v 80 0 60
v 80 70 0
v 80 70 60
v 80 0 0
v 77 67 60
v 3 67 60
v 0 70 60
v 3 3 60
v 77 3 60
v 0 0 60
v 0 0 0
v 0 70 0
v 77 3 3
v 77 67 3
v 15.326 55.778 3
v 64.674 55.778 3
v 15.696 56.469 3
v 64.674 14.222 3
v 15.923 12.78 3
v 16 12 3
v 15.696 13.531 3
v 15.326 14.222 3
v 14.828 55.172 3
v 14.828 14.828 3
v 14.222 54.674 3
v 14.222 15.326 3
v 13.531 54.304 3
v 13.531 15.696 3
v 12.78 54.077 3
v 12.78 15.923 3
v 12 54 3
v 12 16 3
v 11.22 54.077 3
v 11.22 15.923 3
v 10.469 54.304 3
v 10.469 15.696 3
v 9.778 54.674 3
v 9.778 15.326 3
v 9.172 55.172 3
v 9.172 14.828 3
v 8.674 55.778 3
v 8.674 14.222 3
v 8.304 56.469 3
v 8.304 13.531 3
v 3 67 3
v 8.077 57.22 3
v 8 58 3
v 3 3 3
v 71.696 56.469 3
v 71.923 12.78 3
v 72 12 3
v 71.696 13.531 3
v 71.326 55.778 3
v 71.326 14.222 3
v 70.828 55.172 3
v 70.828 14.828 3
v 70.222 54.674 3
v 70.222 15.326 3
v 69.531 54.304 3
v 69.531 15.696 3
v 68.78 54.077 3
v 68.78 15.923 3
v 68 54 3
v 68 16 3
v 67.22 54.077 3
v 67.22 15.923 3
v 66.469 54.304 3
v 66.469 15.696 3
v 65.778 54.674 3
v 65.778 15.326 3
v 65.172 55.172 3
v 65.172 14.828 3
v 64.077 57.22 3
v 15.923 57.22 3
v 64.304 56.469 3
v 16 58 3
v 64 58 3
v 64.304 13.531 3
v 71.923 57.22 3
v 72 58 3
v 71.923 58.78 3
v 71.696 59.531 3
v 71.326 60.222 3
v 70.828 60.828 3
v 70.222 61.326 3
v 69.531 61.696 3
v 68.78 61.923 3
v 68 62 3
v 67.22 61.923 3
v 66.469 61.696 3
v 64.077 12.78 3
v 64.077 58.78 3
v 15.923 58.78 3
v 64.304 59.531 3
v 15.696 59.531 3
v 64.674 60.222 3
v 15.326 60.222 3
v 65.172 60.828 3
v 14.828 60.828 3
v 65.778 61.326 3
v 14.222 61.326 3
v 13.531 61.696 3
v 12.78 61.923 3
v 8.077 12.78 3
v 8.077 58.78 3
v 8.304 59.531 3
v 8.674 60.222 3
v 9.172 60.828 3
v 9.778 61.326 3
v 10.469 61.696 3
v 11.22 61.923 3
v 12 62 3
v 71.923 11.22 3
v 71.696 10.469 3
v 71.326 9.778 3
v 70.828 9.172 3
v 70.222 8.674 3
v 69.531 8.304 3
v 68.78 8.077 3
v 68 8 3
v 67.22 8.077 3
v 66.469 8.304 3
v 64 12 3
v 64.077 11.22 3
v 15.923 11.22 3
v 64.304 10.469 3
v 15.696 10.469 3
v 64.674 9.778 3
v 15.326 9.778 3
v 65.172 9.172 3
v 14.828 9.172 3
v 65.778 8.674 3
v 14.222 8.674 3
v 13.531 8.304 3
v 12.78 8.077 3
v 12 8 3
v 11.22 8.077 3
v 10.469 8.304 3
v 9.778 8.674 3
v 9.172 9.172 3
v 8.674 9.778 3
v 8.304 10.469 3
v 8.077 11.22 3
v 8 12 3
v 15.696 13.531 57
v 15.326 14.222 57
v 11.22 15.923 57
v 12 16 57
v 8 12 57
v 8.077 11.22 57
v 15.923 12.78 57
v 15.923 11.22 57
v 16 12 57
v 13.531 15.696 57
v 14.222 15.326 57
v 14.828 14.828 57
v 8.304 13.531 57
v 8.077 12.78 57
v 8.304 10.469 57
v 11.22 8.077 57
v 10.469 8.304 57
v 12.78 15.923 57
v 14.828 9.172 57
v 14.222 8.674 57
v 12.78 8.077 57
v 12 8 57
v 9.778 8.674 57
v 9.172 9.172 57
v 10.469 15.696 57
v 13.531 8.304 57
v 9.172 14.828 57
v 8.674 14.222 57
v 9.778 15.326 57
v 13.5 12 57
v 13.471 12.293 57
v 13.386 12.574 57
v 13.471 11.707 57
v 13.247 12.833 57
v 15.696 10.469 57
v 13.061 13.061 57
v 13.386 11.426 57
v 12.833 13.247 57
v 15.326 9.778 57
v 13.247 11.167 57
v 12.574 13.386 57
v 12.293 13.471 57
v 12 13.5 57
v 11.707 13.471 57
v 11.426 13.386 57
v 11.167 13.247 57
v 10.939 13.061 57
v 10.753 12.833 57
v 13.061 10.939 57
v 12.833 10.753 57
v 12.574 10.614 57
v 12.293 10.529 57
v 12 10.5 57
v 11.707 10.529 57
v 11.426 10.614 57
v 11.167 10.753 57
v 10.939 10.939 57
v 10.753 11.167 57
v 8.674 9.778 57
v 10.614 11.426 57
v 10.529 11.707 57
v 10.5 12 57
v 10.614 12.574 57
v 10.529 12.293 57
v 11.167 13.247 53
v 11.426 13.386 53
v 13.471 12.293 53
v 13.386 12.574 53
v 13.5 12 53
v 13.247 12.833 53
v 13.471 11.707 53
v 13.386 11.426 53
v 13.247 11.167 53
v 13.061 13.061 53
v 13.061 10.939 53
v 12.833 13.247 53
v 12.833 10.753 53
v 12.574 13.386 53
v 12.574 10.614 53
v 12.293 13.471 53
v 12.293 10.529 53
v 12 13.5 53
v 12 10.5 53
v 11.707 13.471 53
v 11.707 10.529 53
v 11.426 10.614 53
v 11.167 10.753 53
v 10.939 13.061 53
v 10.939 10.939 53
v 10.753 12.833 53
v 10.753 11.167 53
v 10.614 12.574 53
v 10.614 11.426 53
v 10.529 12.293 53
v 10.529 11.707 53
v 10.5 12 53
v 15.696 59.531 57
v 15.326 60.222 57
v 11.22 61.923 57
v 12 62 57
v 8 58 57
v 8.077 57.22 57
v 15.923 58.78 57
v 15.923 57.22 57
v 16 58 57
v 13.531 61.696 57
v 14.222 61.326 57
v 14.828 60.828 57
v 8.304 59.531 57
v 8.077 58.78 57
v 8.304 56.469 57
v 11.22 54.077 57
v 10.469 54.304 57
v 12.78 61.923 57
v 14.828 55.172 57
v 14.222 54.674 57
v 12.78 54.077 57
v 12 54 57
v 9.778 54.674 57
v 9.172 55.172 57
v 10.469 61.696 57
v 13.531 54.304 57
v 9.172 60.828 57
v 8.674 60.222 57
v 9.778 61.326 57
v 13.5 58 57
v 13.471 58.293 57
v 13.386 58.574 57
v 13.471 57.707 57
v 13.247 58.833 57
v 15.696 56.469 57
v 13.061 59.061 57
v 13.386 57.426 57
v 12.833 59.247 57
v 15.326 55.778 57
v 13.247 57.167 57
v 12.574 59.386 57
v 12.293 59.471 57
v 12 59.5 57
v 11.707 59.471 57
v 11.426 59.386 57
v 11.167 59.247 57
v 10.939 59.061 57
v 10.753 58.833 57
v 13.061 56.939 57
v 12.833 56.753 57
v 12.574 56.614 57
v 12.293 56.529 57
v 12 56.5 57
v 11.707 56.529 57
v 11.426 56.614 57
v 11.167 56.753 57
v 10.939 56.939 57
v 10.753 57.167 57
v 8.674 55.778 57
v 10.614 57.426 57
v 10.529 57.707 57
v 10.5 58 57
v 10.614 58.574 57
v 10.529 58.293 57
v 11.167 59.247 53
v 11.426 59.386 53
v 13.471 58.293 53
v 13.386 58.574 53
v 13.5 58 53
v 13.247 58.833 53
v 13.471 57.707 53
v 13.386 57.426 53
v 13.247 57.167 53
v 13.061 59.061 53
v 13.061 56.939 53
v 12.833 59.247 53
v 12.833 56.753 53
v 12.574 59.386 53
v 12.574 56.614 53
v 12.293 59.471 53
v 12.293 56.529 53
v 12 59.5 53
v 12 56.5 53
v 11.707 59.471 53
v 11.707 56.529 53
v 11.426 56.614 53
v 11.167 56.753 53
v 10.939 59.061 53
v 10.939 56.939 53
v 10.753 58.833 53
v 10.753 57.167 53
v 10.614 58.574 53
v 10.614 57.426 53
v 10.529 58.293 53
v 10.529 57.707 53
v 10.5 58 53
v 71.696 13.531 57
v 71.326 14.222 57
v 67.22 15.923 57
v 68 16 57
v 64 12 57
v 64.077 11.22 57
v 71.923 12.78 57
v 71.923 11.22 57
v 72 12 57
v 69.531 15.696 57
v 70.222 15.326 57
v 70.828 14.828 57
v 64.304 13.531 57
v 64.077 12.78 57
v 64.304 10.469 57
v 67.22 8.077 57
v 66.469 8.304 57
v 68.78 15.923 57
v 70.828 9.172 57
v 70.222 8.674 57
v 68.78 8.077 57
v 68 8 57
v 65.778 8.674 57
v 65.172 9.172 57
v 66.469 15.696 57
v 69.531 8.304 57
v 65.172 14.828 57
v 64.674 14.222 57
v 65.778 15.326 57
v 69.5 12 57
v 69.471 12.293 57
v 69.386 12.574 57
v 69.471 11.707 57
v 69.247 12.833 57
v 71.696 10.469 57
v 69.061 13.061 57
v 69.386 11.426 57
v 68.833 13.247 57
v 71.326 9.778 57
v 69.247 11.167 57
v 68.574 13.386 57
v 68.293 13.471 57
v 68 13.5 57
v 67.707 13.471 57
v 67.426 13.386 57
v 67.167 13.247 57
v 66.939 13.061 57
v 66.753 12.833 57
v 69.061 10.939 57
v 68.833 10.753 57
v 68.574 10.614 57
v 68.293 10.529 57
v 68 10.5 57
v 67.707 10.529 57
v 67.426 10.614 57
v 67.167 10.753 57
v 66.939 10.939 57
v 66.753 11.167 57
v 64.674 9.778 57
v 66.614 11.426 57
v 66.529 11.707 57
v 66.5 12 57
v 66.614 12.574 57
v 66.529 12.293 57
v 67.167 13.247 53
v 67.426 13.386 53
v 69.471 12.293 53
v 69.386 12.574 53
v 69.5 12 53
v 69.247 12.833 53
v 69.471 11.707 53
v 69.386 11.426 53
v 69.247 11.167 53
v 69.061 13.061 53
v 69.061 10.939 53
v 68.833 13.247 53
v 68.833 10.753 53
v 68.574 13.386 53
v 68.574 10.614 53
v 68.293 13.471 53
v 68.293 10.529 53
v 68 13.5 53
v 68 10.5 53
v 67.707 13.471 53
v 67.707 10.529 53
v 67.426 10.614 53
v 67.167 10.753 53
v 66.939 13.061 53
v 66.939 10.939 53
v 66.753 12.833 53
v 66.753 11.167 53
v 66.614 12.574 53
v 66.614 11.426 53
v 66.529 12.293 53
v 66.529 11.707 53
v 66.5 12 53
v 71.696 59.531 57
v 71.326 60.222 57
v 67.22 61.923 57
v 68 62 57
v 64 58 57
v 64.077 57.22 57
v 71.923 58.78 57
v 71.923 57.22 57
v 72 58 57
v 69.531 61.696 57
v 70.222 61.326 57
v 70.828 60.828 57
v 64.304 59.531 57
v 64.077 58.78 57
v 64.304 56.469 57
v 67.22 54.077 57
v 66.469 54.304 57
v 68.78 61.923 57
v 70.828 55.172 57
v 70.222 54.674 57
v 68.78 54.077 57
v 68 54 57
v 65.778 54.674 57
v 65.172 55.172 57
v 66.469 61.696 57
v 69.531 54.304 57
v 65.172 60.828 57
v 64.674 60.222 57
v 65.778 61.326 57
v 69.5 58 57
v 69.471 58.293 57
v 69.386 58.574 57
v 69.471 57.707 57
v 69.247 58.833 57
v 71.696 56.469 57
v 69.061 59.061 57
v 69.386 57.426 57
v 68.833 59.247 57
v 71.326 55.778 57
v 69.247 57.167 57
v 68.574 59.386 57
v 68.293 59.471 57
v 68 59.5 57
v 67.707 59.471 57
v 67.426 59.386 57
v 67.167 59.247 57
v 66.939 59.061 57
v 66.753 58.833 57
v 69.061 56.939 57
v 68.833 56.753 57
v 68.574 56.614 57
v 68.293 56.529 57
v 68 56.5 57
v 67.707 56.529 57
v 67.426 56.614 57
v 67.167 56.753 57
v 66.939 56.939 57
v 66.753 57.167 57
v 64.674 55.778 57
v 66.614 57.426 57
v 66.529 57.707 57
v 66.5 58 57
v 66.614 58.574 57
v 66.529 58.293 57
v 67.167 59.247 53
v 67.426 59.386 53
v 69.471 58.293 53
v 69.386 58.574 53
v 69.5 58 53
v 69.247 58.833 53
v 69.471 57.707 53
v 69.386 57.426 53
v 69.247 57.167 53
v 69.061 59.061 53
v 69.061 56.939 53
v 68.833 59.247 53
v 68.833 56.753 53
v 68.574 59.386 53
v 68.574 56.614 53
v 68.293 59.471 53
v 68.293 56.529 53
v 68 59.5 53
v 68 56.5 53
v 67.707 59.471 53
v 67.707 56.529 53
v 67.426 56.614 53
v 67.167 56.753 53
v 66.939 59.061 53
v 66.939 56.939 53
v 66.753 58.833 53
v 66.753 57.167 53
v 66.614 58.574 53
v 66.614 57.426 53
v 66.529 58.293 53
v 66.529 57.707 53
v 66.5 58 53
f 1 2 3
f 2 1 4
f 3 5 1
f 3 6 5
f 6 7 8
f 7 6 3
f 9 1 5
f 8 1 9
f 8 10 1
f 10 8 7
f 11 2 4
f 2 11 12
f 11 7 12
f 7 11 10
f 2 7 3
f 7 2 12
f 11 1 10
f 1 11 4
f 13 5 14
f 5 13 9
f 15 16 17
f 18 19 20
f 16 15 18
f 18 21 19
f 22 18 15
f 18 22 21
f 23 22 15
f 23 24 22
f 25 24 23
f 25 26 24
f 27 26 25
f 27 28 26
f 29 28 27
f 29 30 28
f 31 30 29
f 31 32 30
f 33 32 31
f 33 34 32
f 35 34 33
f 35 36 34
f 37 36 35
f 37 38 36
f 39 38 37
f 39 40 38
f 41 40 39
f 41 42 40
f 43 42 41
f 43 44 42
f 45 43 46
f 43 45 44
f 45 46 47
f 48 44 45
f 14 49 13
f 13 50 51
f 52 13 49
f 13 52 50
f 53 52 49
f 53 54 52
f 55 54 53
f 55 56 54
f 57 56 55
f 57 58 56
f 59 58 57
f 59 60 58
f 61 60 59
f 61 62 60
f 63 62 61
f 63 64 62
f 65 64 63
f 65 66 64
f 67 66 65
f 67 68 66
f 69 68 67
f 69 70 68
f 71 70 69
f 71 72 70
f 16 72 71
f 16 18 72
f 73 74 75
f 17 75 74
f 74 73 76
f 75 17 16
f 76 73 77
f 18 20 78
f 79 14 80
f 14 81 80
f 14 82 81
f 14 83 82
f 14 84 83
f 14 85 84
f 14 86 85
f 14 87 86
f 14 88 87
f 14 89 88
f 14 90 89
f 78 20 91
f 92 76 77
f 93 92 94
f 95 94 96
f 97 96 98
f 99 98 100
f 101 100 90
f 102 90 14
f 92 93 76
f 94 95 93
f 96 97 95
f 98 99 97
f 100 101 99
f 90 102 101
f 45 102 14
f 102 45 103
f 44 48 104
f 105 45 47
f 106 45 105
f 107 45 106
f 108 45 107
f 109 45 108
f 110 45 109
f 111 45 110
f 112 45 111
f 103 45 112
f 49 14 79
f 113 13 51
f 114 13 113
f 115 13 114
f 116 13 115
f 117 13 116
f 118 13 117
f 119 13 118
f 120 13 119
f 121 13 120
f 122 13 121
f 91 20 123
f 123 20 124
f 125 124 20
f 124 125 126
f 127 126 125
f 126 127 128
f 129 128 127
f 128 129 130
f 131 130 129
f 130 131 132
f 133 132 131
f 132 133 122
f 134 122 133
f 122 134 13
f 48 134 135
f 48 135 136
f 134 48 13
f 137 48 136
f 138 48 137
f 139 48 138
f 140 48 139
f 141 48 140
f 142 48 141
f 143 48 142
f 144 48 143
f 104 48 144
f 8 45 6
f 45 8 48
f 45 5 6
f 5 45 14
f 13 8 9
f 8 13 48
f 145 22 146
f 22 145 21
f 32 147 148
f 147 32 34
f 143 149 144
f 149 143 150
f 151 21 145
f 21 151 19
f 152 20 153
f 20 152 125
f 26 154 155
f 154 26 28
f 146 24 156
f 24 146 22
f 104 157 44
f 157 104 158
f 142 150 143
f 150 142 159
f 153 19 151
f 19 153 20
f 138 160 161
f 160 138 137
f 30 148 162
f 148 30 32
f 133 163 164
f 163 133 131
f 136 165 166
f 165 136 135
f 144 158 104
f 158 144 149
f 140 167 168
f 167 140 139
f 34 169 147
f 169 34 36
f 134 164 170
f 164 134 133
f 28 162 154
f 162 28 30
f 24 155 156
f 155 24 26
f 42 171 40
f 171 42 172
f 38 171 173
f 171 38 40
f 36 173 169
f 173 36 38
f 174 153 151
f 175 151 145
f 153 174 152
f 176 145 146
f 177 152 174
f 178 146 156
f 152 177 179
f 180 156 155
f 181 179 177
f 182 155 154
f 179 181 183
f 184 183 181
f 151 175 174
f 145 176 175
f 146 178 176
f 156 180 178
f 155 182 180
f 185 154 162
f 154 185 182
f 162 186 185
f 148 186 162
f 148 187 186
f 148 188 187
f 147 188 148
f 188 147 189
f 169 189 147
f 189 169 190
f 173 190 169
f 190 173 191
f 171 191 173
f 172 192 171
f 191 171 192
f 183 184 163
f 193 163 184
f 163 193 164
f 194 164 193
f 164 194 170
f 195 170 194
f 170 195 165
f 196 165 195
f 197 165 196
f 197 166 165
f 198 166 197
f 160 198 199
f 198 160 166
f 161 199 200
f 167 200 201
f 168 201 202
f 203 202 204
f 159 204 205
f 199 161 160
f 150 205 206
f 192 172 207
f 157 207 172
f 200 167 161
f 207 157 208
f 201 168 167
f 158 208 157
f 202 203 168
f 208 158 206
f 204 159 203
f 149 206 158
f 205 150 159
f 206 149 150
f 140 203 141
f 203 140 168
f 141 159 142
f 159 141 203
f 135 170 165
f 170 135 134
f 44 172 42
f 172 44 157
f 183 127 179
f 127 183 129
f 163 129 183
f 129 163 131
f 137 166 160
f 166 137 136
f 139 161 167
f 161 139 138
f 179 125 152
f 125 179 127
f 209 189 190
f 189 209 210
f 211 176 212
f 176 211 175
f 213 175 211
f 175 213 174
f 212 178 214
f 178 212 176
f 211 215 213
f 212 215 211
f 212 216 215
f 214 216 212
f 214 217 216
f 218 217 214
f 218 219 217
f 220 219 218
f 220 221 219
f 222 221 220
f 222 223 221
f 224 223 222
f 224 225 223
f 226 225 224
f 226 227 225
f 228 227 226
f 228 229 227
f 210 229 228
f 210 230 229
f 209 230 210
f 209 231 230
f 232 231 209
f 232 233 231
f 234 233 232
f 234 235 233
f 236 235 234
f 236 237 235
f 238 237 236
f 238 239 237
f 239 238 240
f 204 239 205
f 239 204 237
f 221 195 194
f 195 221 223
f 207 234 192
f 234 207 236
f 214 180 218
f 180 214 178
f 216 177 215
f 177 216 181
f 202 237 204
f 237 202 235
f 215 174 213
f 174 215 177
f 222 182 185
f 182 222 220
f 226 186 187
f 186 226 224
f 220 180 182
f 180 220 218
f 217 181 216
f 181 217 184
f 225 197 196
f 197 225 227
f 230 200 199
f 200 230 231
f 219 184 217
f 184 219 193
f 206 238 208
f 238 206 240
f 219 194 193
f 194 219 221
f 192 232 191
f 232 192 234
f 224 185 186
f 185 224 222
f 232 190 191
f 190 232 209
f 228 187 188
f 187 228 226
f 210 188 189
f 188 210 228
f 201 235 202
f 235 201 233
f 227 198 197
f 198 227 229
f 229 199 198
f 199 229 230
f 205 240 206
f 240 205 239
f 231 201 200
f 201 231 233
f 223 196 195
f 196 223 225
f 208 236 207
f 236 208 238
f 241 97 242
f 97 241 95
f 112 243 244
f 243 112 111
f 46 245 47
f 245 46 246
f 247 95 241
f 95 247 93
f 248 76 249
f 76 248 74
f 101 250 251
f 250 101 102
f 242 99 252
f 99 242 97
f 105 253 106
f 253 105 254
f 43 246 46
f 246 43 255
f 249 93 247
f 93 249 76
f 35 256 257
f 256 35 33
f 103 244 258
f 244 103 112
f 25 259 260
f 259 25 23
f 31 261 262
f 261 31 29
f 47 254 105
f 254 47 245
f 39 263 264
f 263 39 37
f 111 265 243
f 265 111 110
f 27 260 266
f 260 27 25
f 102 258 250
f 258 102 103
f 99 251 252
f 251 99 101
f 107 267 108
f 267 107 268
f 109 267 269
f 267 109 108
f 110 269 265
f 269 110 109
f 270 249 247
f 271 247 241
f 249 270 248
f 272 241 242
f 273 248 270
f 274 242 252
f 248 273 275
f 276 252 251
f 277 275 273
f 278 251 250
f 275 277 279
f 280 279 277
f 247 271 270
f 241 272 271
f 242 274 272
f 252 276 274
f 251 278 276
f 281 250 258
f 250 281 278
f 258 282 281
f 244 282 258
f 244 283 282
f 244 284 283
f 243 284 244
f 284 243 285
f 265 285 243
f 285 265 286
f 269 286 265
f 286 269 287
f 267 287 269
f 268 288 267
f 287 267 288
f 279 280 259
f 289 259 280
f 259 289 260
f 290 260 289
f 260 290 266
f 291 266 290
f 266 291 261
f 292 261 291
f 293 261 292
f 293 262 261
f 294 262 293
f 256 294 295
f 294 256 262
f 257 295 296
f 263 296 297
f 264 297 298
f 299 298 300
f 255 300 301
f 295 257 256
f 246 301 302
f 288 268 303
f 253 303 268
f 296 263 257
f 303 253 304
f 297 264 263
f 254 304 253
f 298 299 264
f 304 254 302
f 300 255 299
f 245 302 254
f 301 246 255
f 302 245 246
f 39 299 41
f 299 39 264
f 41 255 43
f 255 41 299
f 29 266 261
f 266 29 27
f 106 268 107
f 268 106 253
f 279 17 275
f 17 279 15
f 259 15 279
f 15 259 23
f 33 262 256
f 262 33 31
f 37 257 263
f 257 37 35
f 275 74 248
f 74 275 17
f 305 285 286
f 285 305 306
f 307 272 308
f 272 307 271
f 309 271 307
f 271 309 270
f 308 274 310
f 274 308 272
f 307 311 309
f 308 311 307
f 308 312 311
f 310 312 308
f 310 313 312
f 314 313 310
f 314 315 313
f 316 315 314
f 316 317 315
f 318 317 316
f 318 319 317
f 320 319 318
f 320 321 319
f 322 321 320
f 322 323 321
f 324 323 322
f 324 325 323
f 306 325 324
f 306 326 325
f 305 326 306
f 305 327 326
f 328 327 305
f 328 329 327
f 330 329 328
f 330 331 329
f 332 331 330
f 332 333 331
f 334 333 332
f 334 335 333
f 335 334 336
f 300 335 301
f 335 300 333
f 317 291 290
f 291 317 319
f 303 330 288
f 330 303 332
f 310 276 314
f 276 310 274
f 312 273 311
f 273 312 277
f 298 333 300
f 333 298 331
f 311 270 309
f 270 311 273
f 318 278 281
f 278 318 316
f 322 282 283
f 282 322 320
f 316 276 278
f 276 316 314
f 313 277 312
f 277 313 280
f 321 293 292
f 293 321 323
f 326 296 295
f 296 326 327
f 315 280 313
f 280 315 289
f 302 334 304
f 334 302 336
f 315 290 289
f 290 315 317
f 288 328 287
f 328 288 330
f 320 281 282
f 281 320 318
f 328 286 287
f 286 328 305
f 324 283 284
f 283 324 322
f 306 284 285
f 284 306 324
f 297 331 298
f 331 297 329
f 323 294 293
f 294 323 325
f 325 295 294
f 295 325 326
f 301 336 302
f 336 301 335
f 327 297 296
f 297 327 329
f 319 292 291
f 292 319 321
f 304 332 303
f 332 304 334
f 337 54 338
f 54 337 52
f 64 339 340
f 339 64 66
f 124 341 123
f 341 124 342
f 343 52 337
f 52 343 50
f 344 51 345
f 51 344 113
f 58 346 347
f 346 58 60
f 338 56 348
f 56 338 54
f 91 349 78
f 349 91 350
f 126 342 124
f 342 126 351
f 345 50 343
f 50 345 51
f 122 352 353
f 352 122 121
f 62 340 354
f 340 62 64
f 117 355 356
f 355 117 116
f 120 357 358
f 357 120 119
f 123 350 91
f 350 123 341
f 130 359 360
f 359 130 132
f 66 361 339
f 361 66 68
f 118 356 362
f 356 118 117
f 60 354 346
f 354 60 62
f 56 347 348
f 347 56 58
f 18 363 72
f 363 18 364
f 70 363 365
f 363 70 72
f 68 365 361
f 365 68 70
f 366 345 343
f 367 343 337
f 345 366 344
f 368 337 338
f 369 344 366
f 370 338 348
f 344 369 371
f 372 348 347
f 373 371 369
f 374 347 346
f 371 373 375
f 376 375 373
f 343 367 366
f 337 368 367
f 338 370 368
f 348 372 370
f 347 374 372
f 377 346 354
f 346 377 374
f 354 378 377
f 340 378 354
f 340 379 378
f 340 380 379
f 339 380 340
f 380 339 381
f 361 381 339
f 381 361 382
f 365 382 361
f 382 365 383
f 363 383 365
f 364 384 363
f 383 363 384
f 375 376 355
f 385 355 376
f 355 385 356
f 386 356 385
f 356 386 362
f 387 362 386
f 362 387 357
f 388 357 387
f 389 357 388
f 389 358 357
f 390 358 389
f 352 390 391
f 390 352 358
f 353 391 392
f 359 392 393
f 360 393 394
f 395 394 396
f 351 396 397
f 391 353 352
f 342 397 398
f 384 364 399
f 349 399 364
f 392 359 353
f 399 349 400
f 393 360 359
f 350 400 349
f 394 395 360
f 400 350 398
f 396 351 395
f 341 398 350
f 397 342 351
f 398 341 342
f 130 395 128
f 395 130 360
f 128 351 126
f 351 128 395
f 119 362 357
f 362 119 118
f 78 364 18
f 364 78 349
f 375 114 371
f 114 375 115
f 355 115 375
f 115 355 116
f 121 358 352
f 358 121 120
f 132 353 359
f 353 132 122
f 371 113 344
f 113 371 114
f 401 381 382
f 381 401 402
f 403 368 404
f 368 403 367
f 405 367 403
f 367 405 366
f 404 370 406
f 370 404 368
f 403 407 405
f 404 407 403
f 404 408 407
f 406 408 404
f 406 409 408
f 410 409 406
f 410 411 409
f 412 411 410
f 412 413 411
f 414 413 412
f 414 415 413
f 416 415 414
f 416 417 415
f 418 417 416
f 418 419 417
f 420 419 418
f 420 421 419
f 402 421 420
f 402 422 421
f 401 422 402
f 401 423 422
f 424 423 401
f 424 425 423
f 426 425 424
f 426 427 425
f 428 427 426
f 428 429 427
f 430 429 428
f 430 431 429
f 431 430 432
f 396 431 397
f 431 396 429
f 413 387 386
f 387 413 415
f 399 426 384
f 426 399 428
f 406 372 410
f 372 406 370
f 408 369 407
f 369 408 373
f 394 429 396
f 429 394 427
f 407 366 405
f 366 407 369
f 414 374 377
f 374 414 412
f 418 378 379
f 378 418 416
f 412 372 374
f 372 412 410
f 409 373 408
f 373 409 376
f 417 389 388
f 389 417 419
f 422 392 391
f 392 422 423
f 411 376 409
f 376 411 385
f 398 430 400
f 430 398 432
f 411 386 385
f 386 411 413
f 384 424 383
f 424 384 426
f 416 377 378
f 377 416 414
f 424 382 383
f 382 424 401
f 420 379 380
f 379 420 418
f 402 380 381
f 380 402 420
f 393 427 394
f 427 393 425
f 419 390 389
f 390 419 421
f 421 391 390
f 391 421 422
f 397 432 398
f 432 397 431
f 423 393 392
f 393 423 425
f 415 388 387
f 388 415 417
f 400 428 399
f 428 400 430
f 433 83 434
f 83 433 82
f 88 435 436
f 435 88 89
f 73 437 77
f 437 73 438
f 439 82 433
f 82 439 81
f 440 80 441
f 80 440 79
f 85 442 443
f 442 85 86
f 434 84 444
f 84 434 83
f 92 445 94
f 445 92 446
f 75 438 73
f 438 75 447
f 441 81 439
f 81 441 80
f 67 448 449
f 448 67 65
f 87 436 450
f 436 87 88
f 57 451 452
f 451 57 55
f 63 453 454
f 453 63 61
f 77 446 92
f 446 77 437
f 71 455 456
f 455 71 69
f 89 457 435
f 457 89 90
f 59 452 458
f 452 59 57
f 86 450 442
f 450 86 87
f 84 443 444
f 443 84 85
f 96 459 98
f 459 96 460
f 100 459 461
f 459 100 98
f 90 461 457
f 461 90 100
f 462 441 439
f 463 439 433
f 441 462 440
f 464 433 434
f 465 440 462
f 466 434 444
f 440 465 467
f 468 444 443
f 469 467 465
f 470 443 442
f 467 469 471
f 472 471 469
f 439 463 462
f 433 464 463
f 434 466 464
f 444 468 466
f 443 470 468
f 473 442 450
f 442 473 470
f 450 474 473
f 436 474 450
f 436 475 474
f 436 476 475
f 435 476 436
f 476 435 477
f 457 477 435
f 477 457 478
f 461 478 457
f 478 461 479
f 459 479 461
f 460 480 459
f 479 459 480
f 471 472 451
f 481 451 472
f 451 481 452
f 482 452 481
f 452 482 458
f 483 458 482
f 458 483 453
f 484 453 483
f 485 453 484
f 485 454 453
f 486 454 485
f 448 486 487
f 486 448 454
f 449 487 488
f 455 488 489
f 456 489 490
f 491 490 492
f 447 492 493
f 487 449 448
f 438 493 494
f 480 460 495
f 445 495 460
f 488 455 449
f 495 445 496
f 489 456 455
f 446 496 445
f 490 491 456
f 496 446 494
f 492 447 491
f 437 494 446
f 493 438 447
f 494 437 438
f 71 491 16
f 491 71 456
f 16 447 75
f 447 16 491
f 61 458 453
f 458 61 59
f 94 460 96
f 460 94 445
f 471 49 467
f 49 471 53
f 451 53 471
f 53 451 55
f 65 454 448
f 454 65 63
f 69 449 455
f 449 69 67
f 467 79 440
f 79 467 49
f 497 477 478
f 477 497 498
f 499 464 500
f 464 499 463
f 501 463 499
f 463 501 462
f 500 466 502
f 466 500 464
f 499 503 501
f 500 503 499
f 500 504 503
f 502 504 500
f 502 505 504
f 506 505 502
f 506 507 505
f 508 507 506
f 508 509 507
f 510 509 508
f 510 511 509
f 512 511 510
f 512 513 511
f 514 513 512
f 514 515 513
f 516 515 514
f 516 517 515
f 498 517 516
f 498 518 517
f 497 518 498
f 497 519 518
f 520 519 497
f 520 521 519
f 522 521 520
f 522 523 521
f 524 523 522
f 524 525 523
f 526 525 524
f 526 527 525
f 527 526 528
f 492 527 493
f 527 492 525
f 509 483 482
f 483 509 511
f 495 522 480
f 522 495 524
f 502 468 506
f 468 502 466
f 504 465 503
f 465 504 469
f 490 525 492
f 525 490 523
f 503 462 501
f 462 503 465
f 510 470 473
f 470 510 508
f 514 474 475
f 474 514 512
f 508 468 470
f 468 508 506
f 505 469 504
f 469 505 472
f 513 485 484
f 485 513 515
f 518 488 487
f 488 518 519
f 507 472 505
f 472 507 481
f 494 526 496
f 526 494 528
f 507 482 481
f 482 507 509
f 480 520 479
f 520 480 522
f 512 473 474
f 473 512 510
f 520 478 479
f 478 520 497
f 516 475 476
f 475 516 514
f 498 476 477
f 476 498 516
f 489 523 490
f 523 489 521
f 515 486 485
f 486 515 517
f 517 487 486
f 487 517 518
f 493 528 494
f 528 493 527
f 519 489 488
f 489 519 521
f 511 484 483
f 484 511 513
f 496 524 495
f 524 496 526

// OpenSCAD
$fn = 32;

// ----------------------------------------------------------------------
// Enclosure box: bosses enclosure
// ----------------------------------------------------------------------

// --- parameters (mm) ---
box_l = 80;               // outer length, X
box_w = 70;               // outer width, Y
box_h = 60;               // outer height
wall_t = 3;               // wall thickness
boss_r = 4;               // corner boss radius
hole_r = 1.5;             // boss screw hole radius
boss_in = 12;             // boss inset from the corners
fit_tol = 0.1;            // tolerance for press fits, mm
free_tol = 0.3;           // tolerance for clearance fits, mm

inner_h = box_h - wall_t;  // cavity depth
boss_h = inner_h - 2;  // corner boss height

difference() {
  union() {
    difference() {
      cube([box_l, box_w, box_h]);
      translate([wall_t, wall_t, wall_t])
        cube([box_l - 2 * wall_t, box_w - 2 * wall_t, box_h]);
    }
    for (sx = [0, 1], sy = [0, 1])
      translate([sx ? box_l - boss_in : boss_in,
                 sy ? box_w - boss_in : boss_in, wall_t - 1])
        difference() {
          cylinder(r = boss_r, h = boss_h);
          translate([0, 0, boss_h - 4])
            cylinder(r = hole_r, h = 5);
        }
  }
}
